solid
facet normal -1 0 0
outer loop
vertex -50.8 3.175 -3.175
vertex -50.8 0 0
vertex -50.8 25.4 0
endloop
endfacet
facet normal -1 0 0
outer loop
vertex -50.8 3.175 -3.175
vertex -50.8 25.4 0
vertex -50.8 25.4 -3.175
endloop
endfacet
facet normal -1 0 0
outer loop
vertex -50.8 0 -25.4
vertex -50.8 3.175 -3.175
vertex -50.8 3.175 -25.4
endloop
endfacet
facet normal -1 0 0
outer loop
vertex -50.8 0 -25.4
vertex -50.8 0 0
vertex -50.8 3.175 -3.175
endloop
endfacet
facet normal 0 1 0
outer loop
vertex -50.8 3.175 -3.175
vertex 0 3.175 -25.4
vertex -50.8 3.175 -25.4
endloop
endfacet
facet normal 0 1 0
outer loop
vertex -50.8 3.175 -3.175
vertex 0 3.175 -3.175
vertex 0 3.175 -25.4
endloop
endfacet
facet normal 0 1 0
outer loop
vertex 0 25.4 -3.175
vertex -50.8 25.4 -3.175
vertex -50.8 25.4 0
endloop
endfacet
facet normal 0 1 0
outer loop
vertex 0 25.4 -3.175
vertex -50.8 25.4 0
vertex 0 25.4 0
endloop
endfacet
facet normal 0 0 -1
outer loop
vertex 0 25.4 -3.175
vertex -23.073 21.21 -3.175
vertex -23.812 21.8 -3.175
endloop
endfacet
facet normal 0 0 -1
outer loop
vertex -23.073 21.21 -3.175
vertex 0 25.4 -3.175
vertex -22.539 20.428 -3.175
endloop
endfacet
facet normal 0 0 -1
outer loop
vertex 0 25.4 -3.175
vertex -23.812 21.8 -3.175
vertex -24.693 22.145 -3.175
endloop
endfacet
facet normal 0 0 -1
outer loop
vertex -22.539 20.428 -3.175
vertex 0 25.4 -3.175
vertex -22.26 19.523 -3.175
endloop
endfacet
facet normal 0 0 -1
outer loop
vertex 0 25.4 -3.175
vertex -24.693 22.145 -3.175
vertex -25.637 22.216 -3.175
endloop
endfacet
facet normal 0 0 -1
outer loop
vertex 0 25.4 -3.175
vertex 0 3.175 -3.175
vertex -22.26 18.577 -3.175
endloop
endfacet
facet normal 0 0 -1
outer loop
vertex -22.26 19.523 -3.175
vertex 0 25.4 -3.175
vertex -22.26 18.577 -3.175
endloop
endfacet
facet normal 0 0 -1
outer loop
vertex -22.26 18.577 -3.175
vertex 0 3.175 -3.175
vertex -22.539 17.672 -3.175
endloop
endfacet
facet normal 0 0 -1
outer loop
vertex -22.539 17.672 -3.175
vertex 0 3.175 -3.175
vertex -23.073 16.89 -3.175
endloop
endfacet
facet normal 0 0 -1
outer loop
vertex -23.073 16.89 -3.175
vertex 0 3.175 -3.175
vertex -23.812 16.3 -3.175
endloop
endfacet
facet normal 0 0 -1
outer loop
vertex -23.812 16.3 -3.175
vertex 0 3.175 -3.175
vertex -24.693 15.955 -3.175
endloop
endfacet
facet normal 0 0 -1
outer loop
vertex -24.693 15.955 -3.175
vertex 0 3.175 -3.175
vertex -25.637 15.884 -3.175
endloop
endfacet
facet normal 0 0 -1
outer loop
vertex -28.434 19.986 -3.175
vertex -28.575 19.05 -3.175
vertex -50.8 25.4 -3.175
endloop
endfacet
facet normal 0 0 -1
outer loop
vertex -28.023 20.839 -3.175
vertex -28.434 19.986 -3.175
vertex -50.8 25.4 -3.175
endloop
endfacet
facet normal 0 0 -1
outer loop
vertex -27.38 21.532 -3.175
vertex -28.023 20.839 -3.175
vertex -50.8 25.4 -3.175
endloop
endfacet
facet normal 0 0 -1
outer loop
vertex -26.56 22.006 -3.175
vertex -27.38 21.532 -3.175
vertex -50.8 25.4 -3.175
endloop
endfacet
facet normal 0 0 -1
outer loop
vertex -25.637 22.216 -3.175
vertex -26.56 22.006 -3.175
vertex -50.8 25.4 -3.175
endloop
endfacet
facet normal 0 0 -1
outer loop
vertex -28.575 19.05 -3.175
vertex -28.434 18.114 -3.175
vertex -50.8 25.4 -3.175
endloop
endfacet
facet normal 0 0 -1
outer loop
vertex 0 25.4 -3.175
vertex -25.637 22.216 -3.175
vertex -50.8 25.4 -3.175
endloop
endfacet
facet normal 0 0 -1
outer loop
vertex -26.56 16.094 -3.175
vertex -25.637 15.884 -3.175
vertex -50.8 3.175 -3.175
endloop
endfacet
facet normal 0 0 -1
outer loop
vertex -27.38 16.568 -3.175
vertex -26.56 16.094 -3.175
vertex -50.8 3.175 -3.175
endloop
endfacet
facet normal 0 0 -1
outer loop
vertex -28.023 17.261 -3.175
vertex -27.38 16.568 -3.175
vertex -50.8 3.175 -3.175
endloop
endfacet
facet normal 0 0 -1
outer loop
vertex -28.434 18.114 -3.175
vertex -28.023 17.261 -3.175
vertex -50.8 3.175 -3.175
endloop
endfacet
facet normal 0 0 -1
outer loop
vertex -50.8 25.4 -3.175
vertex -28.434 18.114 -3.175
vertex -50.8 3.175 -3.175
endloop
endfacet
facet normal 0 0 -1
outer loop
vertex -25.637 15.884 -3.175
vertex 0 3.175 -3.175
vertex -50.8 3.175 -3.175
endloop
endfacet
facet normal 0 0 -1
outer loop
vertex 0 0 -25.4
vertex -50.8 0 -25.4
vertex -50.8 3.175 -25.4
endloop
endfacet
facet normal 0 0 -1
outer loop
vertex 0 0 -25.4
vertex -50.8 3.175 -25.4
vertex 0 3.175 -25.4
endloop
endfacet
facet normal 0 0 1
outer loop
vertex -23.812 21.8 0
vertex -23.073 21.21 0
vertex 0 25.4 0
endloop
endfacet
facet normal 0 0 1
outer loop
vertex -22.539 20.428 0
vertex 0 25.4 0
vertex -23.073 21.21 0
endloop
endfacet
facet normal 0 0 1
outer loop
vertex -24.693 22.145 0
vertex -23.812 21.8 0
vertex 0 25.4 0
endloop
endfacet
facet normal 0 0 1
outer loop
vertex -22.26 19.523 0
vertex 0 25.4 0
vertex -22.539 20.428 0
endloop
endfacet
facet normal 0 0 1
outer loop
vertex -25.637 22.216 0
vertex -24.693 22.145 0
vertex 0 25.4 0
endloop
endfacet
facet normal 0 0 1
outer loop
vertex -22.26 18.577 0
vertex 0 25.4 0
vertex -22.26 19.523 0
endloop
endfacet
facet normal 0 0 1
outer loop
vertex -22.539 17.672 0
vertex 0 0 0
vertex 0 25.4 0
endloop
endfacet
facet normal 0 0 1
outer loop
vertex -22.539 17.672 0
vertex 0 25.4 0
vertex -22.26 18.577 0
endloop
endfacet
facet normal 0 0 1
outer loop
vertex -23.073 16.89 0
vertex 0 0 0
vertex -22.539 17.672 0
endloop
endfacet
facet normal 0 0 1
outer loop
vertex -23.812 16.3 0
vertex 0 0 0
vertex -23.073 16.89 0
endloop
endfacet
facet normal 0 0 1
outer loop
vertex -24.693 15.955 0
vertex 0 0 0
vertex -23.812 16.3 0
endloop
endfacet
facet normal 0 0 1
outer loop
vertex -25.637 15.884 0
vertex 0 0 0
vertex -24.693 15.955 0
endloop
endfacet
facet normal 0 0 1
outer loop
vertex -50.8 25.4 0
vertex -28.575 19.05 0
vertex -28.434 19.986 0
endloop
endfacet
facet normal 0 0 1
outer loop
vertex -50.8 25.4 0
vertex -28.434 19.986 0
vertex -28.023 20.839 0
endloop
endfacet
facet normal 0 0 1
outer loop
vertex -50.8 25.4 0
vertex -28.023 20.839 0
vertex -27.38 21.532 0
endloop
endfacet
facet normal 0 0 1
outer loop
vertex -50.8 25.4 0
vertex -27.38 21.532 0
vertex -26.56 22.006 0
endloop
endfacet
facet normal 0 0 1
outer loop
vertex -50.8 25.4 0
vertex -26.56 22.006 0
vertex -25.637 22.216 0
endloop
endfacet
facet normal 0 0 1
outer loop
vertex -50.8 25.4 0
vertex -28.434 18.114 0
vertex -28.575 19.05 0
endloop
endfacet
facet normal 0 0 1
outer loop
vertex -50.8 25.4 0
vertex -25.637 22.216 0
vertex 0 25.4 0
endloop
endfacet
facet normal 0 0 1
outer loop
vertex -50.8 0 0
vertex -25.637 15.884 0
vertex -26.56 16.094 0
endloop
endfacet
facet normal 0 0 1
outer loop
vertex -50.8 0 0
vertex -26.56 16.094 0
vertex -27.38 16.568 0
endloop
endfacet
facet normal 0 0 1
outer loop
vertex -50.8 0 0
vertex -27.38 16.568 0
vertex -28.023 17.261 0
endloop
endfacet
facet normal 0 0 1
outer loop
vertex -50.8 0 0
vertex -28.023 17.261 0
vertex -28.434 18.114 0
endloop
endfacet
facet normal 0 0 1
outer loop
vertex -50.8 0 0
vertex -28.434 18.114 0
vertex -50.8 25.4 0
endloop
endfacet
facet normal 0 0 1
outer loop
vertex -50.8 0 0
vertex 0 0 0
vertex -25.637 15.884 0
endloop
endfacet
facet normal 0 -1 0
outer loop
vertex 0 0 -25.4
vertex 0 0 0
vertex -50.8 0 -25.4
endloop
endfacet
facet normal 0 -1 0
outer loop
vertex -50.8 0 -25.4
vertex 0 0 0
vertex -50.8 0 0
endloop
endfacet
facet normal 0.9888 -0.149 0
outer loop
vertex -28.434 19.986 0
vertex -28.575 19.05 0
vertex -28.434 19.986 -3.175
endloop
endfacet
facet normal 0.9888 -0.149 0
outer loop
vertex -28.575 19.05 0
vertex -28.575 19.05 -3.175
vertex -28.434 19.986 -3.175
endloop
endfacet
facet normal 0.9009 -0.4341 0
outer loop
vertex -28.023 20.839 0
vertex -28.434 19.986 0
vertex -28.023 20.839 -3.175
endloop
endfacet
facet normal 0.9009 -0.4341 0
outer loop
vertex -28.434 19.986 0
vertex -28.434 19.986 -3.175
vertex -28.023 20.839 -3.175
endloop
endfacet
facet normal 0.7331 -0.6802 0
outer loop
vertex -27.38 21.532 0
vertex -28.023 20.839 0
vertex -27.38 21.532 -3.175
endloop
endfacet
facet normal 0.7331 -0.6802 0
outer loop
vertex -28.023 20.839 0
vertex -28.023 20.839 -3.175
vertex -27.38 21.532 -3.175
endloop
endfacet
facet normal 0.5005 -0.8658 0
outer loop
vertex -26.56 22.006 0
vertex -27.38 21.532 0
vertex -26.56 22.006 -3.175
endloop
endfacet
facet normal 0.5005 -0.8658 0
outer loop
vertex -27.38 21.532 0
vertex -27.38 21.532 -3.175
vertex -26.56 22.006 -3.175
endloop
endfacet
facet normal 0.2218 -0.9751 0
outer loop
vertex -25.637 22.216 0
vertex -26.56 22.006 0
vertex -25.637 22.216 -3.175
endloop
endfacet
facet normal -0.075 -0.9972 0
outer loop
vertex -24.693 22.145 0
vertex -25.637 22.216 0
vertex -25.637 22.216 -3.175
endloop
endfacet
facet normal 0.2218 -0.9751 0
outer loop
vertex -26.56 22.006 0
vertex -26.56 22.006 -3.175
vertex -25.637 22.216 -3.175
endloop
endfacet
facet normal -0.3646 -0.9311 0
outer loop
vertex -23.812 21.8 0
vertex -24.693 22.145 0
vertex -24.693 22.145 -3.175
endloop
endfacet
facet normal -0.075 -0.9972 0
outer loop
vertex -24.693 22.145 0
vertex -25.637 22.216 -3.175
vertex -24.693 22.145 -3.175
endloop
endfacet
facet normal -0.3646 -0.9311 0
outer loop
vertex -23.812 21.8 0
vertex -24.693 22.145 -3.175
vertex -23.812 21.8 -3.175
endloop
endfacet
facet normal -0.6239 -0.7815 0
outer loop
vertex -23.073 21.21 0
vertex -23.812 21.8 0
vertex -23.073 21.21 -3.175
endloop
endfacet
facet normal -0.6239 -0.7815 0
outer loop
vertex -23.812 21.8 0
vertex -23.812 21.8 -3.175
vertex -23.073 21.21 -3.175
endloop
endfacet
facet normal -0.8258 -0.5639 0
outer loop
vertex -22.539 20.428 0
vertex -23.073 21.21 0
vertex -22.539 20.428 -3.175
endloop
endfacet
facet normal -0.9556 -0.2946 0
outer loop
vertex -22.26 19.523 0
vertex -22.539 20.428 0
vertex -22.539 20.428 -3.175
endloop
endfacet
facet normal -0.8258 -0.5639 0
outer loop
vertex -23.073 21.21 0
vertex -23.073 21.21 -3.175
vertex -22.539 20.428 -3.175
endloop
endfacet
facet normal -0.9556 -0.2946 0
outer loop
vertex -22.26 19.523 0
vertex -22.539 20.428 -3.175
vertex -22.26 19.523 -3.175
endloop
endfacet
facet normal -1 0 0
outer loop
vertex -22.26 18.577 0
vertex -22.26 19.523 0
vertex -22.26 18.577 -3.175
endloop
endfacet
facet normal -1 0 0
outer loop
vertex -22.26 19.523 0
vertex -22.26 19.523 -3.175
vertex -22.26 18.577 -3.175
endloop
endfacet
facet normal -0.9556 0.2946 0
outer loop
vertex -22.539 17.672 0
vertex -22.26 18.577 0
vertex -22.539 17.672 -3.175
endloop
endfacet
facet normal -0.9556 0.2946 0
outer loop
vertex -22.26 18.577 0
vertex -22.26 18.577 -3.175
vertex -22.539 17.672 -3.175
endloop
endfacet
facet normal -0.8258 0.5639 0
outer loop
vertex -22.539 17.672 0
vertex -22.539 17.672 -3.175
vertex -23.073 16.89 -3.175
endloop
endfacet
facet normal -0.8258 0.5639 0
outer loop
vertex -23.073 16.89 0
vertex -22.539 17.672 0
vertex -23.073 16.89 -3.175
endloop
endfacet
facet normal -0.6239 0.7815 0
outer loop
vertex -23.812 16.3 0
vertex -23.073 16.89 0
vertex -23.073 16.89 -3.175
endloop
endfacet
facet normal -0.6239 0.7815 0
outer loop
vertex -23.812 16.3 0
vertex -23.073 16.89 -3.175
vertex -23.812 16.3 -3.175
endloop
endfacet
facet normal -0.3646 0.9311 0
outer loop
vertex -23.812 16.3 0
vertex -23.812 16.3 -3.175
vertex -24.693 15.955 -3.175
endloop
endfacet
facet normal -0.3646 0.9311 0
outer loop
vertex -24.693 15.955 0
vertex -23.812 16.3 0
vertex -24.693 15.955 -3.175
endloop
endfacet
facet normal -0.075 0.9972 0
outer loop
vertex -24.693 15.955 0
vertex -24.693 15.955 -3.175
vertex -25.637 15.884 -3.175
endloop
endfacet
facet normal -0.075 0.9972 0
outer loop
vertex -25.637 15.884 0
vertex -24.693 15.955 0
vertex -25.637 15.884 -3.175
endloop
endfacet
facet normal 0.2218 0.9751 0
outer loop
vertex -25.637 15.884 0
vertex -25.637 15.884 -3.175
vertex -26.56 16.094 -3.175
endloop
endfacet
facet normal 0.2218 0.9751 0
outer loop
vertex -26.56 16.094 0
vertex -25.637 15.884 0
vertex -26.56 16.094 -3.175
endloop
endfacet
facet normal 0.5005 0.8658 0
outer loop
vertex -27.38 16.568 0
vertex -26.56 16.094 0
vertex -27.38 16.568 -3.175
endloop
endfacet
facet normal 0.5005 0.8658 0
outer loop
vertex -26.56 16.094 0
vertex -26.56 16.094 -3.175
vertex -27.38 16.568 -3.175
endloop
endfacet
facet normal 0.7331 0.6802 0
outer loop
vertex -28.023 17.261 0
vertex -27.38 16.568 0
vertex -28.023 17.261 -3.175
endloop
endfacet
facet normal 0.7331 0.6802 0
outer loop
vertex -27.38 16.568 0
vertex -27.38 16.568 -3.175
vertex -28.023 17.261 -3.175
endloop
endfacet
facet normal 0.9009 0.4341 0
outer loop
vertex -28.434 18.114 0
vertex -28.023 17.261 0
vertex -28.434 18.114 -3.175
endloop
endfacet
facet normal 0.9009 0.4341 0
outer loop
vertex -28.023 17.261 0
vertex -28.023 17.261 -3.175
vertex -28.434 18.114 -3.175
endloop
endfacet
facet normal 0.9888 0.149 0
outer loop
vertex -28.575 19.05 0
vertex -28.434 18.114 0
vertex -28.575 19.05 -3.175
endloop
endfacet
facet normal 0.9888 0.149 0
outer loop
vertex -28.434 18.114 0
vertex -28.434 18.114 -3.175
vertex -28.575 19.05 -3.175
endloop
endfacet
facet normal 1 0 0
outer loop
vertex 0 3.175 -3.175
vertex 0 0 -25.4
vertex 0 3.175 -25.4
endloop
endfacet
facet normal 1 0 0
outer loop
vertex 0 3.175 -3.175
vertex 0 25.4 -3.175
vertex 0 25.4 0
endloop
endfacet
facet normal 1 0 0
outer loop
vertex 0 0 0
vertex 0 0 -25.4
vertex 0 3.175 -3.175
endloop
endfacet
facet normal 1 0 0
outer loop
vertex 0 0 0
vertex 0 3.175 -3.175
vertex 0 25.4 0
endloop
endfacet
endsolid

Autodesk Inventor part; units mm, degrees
ref_plane "YZ Plane" through (0, 0, 0) normal (1, 0, 0) x (0, 1, 0)
ref_plane "XZ Plane" through (0, 0, 0) normal (0, 1, 0) x (-1, 0, 0)
ref_plane "XY Plane" through (0, 0, 0) normal (0, 0, 1) x (1, 0, 0)
sketch "Sketch1" plane through (0, 0, 0) normal (0, 1, 0) x (-1, 0, 0)
  line L0 (0, 0) -> (50.8, 0)
  line L1 (50.8, 0) -> (50.8, -25.4)
  line L2 (50.8, -25.4) -> (0, -25.4)
  line L3 (0, -25.4) -> (0, 0)
  dimension "d0" = 50.8
  dimension "d1" = 25.4
extrude "Extrusion1" add sketch "Sketch1" along normal blind 3.175
sketch "Sketch2" plane through (0, 3.175, 0) normal (0, 1, 0) x (1, 0, 0)
  line L0 (-50.8, 0) -> (0, 0)
  line L1 (0, 0) -> (0, 3.175)
  line L2 (0, 3.175) -> (-50.8, 3.175)
  line L3 (-50.8, 3.175) -> (-50.8, 0)
  dimension "d4" = 50.8
  dimension "d5" = 3.175
extrude "Extrusion2" add sketch "Sketch2" along normal blind 22.225
sketch "Sketch3" plane through (0, 3.175, -3.175) normal (0, 0, -1) x (-1, 0, 0)
  circle A0 centre (25.4, 15.875) radius 3.175
  line L0 (0, 22.225) -> (50.8, 22.225) projected
  line L1 (50.8, 0) -> (50.8, 22.225) projected
  point P0 (0, -3.175)
  dimension "d8" = 6.35
  dimension "d9" = 6.35
  dimension "d10" = 25.4
extrude "Extrusion3" cut sketch "Sketch3" against normal through all
properties part number "Gusset"
